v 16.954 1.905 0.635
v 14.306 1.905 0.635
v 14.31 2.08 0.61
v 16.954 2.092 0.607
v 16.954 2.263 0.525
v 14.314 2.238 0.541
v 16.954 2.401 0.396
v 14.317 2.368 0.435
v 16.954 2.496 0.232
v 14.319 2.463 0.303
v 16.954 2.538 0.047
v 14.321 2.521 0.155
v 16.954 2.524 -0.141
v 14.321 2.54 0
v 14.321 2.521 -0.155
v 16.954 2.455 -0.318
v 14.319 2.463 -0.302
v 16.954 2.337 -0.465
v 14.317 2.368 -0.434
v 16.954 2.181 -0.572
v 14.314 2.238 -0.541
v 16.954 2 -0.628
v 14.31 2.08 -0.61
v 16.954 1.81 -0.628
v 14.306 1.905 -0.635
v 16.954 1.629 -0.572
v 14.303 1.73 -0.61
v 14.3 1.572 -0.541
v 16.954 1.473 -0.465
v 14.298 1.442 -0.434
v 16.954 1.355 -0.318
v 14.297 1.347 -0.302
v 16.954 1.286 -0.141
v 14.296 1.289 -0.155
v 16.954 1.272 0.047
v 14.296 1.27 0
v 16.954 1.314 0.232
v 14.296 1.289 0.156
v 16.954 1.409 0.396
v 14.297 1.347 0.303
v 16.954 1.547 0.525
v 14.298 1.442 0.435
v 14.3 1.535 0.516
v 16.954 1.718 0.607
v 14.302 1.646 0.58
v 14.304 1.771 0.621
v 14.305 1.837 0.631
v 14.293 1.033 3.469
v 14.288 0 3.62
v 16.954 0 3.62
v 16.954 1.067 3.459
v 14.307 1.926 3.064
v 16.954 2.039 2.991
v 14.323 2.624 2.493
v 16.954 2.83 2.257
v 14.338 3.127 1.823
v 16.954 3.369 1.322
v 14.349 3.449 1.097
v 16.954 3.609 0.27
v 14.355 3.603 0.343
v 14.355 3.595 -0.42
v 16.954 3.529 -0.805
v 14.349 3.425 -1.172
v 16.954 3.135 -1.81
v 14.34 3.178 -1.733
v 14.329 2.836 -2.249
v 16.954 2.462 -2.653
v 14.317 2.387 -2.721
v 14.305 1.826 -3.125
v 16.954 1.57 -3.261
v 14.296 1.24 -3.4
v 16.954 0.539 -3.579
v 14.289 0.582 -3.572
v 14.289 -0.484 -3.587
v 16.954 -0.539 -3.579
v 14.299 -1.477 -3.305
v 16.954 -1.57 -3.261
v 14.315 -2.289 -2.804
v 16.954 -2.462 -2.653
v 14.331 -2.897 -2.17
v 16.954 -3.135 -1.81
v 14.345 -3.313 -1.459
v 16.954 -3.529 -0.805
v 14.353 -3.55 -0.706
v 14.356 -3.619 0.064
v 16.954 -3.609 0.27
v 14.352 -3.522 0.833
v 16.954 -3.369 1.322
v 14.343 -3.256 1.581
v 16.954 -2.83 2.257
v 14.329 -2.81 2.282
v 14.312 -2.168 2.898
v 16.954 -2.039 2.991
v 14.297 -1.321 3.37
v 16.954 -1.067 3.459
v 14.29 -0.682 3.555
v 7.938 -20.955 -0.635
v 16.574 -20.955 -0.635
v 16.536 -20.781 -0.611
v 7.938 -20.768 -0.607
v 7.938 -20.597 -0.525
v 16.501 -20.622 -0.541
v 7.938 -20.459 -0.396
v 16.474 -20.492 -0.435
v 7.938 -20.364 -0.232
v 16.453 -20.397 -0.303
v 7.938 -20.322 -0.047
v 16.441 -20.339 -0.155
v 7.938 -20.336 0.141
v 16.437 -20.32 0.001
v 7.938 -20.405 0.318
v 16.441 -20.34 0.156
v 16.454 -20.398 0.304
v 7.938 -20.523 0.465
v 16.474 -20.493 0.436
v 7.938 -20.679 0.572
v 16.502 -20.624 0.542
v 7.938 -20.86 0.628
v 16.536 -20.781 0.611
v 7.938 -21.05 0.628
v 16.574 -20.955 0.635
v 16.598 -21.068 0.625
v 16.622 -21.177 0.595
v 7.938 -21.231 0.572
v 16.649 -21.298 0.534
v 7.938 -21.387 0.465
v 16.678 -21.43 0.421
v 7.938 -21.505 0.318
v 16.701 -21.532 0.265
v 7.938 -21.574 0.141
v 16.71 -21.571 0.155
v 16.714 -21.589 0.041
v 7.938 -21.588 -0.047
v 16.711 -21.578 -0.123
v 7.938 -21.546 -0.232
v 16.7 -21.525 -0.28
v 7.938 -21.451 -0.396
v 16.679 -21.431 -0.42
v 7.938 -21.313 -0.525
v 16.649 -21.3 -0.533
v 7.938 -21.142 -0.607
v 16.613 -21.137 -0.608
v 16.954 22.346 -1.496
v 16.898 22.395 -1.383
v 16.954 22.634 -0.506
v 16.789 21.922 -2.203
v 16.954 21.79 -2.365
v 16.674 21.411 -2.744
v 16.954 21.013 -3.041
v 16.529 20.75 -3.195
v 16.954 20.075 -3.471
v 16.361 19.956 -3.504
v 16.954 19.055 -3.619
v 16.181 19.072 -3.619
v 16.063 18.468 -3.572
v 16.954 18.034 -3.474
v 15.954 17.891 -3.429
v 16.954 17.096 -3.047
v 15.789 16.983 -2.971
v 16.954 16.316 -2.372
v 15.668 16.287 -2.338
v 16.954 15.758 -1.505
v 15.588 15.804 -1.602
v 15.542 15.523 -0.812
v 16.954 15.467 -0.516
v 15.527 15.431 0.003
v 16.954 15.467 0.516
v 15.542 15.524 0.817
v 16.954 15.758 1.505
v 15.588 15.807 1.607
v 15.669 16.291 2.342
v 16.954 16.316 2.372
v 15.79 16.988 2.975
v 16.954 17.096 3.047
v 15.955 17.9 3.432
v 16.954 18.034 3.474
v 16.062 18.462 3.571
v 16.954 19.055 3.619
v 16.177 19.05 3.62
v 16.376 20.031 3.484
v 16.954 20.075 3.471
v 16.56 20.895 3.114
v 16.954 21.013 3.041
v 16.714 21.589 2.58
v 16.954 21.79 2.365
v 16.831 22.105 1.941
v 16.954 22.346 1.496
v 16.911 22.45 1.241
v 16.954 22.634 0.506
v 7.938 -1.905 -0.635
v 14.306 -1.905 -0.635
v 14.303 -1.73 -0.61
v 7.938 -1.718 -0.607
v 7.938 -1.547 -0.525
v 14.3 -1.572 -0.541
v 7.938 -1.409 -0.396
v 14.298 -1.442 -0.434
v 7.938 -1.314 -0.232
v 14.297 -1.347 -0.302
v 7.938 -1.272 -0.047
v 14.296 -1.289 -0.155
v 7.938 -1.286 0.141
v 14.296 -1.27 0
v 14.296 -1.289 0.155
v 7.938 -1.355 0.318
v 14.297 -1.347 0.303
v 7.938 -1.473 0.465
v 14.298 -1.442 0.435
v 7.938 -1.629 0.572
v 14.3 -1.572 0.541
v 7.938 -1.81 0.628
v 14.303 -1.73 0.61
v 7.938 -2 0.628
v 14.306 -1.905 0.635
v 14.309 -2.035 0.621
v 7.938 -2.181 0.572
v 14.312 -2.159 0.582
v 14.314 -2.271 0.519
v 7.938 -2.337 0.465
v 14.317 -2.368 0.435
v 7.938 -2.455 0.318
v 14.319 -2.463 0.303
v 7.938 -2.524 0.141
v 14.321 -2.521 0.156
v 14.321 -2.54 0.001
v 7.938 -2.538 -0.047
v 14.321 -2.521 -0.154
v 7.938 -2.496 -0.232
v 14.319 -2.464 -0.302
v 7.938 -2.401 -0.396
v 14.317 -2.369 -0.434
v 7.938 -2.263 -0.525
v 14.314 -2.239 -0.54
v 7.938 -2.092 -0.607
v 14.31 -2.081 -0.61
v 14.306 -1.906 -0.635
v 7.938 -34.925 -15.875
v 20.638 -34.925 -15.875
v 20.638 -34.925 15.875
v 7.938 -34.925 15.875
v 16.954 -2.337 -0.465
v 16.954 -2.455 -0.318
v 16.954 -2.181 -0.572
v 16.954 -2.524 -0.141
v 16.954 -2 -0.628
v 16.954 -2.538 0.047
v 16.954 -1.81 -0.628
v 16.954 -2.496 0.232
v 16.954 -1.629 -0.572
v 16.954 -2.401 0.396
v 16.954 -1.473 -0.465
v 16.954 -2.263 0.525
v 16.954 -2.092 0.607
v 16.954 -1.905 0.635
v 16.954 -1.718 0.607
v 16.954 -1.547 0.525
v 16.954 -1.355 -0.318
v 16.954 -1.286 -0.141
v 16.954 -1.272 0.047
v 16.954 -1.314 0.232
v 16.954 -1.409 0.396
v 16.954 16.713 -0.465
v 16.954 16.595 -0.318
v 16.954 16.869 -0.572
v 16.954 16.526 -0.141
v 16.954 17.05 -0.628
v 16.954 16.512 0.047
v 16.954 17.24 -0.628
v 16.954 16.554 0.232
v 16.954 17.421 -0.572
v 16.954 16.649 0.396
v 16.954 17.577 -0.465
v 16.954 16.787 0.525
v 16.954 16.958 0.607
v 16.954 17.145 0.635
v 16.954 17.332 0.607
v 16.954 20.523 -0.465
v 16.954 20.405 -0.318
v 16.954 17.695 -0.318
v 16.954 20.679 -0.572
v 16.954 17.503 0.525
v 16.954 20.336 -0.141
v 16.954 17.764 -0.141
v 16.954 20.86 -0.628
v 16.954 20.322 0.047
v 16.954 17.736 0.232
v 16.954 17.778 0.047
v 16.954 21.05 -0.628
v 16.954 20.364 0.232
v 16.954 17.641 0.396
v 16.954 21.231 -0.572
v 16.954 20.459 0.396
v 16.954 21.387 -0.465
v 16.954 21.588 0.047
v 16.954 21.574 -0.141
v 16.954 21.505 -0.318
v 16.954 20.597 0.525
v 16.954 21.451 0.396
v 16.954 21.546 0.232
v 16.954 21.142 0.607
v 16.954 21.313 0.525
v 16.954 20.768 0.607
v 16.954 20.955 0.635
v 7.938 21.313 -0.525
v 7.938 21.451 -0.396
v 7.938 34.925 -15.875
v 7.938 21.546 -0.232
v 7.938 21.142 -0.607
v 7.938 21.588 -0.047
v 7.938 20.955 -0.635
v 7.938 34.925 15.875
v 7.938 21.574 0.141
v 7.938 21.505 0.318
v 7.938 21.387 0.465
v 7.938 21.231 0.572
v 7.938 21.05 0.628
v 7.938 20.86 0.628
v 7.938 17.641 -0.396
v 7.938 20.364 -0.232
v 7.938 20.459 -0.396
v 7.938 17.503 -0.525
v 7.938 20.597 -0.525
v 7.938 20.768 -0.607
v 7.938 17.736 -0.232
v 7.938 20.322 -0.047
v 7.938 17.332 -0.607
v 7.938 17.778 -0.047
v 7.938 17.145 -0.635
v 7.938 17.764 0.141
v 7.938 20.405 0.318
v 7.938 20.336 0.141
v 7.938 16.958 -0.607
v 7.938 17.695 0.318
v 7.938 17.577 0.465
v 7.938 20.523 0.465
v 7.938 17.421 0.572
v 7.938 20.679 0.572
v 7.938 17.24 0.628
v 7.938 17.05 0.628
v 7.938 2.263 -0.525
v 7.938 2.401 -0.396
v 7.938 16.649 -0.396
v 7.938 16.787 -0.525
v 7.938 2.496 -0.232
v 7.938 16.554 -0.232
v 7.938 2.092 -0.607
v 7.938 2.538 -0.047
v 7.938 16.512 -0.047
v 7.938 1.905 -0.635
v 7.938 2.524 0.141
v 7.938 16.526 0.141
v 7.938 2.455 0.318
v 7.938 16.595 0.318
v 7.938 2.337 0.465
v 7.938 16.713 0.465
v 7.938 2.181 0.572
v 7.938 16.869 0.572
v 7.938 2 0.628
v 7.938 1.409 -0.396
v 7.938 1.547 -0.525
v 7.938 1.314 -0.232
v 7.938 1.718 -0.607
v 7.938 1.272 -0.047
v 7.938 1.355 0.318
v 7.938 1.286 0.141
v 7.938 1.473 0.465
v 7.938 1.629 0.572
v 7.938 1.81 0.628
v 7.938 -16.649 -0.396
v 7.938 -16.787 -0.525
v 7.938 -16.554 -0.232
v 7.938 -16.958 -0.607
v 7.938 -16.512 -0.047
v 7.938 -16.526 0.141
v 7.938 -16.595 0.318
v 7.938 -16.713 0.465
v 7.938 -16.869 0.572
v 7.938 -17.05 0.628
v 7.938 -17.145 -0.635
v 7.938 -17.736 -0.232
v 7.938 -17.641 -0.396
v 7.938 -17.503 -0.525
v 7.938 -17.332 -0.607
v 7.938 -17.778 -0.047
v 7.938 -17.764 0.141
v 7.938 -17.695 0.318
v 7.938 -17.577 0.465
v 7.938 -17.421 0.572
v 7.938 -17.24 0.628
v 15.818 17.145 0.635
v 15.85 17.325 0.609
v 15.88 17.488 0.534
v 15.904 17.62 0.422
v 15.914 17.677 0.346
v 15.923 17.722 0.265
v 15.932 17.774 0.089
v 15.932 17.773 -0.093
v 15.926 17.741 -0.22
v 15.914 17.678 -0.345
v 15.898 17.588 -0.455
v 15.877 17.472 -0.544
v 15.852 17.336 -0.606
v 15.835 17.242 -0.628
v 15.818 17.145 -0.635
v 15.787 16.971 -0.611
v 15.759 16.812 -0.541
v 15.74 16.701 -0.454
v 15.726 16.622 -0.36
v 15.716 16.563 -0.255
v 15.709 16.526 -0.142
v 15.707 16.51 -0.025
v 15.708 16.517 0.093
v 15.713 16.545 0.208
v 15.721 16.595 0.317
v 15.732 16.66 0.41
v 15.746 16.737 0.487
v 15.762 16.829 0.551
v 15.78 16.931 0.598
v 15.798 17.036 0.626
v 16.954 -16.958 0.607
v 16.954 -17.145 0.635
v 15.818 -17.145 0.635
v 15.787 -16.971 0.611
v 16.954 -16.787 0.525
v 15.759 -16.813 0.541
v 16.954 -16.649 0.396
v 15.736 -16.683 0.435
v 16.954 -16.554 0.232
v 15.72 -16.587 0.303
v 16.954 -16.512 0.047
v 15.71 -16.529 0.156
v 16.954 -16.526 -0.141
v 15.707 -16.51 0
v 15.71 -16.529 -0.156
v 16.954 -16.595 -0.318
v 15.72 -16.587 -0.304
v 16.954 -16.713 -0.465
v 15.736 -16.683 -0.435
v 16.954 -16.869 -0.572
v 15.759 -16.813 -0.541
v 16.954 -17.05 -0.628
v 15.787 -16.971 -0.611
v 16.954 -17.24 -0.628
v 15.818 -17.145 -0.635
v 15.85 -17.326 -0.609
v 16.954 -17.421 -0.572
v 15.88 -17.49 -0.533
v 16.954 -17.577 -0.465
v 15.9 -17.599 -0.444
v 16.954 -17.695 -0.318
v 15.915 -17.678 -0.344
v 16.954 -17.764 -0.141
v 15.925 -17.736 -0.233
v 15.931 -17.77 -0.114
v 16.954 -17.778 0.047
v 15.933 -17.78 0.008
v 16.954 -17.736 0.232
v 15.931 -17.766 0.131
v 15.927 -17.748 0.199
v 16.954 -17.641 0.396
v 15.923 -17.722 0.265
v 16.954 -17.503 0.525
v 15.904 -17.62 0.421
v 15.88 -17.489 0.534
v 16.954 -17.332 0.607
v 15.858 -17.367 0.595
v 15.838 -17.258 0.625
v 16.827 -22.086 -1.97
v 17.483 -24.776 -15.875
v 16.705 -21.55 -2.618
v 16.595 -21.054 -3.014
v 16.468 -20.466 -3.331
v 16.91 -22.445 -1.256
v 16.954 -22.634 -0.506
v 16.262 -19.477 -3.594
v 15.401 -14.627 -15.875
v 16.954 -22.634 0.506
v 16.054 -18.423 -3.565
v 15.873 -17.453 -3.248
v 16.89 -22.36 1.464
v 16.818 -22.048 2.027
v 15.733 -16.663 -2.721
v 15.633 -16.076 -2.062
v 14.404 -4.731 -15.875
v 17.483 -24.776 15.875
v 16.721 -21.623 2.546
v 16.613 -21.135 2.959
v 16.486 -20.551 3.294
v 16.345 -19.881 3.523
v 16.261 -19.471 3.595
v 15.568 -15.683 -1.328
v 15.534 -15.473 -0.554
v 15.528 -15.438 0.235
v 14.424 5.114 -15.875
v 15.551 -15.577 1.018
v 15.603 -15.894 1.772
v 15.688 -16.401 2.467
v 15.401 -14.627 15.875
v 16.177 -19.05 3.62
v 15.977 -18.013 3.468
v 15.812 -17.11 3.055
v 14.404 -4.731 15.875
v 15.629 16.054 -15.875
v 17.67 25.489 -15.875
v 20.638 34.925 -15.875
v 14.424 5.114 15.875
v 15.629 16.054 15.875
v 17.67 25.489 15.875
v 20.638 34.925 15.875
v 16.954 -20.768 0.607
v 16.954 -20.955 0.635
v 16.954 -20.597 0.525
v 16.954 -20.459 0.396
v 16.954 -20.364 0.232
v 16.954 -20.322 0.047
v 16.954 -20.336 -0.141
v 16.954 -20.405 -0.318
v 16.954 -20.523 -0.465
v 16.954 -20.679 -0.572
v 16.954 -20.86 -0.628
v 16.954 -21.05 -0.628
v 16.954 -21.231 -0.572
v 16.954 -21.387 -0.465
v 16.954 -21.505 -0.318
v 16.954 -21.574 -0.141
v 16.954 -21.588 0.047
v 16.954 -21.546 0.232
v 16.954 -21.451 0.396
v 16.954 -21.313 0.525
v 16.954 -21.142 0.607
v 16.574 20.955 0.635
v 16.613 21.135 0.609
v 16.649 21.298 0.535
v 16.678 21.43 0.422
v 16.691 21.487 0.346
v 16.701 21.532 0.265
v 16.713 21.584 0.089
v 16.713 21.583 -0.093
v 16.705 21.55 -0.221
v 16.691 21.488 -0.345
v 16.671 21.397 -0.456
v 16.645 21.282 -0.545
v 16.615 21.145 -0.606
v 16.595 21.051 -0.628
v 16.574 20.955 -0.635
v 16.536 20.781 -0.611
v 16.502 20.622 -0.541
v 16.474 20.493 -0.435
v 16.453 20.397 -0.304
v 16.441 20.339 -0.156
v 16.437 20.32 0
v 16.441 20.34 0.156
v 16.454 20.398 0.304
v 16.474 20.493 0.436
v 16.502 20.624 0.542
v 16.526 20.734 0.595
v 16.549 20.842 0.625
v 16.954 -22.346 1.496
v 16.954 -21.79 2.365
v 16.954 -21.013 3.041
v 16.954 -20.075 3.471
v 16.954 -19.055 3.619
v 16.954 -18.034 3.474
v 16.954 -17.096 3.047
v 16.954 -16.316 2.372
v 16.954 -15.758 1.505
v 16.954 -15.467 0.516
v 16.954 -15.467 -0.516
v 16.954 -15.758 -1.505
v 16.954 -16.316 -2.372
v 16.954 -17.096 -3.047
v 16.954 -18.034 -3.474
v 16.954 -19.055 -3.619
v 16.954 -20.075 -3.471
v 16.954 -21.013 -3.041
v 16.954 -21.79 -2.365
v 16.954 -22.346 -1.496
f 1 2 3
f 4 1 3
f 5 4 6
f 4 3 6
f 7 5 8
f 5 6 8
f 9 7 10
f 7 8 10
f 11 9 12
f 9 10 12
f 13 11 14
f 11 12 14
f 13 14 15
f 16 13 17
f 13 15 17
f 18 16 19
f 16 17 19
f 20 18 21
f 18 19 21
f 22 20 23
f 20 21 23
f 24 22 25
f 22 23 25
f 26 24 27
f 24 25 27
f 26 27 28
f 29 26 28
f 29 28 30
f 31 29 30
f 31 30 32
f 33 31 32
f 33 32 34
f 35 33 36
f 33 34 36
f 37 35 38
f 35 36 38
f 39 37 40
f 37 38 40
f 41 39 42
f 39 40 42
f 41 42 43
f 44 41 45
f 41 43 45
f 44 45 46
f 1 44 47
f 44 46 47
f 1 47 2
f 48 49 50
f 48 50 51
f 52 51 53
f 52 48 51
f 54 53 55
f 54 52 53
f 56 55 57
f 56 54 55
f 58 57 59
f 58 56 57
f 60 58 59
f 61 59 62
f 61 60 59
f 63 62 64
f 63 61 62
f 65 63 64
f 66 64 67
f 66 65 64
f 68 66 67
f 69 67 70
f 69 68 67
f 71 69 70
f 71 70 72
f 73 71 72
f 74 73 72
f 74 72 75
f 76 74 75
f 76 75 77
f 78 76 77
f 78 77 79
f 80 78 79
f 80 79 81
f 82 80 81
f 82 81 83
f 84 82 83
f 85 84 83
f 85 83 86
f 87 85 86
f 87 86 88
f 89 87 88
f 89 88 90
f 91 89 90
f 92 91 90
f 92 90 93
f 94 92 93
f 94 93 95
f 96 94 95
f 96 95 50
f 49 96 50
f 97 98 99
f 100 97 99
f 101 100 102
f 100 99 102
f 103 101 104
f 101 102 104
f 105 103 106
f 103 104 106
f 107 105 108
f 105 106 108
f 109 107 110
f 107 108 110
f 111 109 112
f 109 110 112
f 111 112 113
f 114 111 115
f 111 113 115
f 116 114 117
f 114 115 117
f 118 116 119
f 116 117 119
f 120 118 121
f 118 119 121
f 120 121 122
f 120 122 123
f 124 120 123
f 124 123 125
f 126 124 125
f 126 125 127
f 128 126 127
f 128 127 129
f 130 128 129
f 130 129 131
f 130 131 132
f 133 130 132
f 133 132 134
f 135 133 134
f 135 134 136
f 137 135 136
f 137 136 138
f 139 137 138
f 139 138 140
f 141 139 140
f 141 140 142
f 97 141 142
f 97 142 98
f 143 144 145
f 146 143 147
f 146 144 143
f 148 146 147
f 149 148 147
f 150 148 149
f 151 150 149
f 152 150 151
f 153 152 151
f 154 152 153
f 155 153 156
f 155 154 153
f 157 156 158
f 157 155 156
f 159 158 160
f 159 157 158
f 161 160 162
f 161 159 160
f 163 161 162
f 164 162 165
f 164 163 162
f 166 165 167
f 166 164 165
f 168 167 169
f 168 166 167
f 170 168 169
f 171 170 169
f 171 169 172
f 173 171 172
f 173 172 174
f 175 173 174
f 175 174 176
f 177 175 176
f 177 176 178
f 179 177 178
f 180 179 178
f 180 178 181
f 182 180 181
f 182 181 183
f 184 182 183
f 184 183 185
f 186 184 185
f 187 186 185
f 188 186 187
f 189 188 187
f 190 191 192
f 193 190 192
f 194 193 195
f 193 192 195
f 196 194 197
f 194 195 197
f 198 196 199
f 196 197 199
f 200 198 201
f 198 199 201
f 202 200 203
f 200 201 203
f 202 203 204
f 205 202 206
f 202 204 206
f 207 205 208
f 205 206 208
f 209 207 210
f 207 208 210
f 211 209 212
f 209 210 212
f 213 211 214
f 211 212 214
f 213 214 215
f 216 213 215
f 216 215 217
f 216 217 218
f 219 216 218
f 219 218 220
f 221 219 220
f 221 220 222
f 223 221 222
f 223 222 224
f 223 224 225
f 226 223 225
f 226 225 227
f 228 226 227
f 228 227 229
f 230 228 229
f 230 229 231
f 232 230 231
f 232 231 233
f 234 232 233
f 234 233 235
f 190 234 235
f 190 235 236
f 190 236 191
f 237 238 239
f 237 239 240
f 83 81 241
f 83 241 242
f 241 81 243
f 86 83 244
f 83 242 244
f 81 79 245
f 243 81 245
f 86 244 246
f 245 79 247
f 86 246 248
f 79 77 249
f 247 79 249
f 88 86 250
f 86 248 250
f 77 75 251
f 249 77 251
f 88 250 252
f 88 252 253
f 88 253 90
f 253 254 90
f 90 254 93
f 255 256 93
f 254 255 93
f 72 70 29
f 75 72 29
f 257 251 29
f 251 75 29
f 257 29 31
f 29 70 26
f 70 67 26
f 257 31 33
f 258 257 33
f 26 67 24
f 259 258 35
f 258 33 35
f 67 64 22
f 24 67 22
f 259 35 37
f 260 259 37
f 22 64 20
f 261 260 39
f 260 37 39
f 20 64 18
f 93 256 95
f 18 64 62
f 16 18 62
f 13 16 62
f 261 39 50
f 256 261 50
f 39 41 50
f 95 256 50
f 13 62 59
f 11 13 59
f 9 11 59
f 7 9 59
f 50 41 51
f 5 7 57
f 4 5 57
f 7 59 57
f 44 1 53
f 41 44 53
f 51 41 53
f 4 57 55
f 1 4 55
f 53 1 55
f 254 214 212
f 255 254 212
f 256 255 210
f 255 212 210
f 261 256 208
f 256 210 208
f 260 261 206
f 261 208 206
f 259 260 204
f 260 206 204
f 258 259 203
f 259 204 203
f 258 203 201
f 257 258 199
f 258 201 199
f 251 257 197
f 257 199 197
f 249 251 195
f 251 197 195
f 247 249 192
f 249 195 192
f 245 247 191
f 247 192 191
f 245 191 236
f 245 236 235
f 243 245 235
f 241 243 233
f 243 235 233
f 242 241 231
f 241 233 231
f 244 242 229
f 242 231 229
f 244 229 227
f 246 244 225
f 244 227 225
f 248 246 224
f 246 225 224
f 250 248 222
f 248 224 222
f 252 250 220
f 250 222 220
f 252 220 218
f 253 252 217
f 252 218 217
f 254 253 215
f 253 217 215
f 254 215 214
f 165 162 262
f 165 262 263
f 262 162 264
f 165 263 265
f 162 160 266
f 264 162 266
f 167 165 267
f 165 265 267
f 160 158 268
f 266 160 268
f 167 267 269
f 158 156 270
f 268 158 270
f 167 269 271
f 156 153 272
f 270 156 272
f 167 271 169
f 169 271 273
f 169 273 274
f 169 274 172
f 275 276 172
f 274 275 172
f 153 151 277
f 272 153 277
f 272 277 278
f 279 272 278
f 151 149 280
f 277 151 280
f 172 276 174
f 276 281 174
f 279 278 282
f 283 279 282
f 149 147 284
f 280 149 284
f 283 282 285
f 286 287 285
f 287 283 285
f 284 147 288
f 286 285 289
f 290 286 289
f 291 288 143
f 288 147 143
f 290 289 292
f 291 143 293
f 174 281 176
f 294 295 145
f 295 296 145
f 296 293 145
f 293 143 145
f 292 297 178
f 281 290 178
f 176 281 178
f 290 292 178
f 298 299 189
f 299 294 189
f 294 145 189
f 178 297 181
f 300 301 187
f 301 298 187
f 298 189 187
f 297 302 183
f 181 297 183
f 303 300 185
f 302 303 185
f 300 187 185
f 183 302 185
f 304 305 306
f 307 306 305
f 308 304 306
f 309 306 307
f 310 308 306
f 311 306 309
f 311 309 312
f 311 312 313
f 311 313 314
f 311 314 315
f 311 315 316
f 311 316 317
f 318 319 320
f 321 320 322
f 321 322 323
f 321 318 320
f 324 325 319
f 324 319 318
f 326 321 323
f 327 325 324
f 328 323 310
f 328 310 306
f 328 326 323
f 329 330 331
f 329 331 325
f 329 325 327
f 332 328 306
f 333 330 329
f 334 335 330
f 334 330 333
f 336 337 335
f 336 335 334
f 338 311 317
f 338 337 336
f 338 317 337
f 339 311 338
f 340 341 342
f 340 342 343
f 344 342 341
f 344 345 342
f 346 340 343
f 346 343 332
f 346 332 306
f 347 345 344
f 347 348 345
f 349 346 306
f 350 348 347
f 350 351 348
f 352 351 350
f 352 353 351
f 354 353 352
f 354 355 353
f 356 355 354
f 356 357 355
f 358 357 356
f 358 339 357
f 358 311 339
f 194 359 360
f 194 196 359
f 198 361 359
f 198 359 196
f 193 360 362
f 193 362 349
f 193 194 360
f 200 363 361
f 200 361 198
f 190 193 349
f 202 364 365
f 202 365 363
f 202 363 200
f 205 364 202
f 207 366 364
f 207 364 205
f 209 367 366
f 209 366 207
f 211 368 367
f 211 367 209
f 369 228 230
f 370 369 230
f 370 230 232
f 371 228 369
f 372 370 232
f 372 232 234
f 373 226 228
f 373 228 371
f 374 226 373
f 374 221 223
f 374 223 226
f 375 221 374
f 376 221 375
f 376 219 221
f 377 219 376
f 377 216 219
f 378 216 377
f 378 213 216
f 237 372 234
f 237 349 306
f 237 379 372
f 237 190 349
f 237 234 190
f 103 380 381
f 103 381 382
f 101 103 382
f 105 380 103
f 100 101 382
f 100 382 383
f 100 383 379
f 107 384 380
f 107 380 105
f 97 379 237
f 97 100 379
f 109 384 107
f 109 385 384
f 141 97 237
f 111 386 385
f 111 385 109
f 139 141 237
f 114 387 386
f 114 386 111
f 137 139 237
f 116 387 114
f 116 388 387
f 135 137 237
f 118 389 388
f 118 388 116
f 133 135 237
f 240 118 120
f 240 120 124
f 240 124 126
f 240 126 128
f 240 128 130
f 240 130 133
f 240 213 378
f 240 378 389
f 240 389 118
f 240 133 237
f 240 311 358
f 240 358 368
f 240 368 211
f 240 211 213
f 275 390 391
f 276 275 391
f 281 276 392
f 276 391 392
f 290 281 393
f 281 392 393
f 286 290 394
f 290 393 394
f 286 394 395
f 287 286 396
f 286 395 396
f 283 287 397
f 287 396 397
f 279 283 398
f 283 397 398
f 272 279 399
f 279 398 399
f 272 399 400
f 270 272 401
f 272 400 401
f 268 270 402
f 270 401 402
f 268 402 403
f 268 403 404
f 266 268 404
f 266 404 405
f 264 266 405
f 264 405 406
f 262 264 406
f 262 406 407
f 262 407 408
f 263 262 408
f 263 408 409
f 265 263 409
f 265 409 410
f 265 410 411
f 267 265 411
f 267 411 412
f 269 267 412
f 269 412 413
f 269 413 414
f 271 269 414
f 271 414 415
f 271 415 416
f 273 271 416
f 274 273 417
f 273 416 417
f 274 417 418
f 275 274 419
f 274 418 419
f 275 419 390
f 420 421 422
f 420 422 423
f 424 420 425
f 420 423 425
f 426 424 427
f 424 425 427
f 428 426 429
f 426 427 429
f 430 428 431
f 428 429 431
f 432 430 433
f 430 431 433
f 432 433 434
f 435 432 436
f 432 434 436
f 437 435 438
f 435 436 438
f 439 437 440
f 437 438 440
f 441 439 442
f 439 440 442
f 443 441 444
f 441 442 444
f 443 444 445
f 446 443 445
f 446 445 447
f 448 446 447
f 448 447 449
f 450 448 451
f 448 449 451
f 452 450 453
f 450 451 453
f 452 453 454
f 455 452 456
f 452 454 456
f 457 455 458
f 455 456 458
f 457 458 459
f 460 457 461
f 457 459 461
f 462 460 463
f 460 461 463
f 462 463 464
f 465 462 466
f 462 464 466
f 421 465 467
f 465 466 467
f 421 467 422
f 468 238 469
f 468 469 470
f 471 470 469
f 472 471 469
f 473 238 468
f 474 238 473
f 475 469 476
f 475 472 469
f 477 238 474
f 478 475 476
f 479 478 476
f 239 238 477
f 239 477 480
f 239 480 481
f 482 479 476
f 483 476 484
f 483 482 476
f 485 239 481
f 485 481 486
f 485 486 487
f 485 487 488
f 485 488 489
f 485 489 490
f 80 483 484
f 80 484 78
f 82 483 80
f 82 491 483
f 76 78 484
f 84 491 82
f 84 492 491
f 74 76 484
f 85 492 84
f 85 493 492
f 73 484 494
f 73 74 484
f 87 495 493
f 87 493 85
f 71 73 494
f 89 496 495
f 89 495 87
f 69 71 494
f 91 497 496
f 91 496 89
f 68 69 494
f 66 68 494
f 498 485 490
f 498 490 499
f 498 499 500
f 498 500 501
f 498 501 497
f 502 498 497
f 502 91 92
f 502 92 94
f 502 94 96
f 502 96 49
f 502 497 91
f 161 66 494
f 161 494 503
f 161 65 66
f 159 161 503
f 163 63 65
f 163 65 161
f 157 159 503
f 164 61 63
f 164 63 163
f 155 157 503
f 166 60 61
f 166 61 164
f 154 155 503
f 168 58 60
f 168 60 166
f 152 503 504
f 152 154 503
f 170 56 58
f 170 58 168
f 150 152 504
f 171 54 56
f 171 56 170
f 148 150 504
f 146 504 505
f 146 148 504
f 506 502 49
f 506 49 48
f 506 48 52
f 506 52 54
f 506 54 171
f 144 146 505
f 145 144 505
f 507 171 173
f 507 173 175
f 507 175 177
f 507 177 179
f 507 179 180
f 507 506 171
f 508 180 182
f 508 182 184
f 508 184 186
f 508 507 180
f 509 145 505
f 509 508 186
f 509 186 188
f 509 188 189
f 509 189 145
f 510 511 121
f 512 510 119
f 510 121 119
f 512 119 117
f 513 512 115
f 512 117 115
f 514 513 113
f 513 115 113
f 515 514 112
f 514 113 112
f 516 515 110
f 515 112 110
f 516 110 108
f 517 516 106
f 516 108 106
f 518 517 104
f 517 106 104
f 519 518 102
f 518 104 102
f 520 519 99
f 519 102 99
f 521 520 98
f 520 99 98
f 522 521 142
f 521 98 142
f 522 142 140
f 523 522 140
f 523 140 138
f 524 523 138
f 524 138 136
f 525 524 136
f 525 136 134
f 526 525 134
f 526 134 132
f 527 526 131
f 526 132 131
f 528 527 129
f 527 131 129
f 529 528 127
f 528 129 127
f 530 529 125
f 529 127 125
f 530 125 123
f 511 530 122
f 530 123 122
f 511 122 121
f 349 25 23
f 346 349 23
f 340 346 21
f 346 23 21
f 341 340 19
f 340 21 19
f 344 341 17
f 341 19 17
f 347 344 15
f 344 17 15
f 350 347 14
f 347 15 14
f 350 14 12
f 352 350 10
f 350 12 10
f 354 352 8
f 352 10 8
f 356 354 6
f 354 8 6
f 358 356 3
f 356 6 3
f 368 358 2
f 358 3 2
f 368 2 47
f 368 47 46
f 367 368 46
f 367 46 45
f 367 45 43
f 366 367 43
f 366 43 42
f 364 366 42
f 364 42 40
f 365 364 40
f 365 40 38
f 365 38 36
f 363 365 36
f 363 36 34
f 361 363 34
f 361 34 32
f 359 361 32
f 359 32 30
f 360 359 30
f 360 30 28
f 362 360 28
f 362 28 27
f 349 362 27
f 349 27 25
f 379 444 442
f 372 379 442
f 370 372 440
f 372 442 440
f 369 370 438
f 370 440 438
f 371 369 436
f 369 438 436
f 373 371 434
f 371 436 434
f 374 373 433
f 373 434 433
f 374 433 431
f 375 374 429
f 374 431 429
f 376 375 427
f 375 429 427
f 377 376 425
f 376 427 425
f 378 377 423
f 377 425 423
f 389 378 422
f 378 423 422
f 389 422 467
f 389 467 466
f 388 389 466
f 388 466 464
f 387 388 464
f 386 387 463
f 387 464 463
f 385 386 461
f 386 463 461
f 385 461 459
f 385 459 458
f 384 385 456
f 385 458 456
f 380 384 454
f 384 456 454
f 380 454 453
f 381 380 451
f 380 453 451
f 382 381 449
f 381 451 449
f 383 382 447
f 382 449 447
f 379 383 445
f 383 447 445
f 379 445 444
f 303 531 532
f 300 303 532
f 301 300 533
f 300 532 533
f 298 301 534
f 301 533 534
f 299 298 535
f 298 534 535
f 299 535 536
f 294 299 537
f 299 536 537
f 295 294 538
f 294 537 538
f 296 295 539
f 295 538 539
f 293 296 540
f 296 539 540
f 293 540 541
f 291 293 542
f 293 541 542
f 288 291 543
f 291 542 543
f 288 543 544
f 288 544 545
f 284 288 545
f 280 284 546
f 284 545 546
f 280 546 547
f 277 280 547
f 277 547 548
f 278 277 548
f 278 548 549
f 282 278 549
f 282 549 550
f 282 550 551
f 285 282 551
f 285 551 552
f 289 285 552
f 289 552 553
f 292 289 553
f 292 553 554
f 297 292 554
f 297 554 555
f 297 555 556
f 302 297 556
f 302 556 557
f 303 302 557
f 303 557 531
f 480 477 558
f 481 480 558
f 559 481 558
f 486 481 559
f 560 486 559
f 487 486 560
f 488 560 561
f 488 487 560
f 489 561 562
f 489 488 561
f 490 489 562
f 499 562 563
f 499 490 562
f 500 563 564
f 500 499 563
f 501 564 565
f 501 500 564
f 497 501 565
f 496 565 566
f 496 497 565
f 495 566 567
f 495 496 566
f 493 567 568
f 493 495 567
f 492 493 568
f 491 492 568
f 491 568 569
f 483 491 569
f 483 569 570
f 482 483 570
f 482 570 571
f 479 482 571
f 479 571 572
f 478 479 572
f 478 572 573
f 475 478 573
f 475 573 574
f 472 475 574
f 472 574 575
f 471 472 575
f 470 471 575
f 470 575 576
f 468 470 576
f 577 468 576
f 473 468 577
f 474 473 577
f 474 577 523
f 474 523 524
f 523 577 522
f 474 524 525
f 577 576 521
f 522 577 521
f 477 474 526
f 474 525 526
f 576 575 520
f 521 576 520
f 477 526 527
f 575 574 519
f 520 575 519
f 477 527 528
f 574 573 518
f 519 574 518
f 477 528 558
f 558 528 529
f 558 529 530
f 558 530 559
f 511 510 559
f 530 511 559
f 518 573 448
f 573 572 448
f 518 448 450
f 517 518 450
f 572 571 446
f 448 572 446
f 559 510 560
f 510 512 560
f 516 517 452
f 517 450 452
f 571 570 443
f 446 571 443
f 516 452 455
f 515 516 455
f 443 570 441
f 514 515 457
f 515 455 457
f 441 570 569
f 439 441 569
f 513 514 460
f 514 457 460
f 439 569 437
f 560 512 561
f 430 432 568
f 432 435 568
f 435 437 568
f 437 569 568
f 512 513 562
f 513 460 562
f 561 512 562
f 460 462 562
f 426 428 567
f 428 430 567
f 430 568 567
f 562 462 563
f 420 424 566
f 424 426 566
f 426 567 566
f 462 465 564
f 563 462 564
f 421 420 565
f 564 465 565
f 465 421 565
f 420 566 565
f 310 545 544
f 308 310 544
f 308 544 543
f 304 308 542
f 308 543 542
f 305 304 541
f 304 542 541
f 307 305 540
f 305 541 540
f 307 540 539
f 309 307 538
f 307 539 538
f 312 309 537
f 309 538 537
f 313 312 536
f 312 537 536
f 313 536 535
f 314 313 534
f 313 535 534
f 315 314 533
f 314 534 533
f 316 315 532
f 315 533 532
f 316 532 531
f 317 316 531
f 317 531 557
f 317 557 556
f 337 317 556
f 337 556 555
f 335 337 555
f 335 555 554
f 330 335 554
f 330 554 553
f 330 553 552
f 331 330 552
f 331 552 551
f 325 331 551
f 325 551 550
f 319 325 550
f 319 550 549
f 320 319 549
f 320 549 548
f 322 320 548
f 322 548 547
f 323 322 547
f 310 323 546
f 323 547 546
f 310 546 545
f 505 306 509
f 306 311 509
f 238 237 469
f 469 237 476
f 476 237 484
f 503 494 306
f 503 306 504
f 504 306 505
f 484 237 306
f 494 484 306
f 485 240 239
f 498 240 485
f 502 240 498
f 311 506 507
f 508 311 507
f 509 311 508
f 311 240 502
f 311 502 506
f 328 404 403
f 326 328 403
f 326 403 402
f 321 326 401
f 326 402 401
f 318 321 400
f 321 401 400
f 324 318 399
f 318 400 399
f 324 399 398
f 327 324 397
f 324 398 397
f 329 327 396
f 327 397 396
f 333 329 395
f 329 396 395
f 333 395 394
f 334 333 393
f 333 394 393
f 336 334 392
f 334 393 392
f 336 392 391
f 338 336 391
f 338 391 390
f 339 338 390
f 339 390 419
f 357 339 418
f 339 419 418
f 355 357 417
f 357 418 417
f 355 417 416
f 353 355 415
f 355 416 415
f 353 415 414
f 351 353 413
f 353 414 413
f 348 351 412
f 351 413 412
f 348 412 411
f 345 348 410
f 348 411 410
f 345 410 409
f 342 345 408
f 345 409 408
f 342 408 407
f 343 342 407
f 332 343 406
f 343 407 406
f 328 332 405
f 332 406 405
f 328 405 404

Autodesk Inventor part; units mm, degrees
ref_plane "YZ Plane" through (0, 0, 0) normal (1, 0, 0) x (0, 1, 0)
ref_plane "XZ Plane" through (0, 0, 0) normal (0, 1, 0) x (-1, 0, 0)
ref_plane "Work Plane1" through (6.35, -34.925, 15.875) normal (0, 0, 1) x (1, 0, 0)
sketch "Sketch3" plane through (6.35, -34.925, 15.875) normal (0, 0, 1) x (1, 0, 0)
  line L0 (1.5875, 69.85) -> (1.5875, 0) projected
  line L1 (14.2875, 0) -> (1.5875, 34.925) construction
  line L2 (1.5875, 34.925) -> (14.2875, 69.85) construction
  spline S0 degree 2 poles (14.2875, 0) (1.5875, 34.925) (14.2875, 69.85) knots 1 1 1 2 2 2
  line L3 (1.5875, 69.85) -> (14.2875, 69.85)
  line L4 (14.2875, 0) -> (1.5875, 0)
  point P0 (-6.35, 34.925)
  dimension "d9" = 12.7
  dimension "d10" = 12.7
extrude "Extrusion3" add sketch "Sketch3" against normal blind 31.75
sketch "Sketch4" plane through (7.9375, -34.925, 15.875) normal (-1, 0, 0) x (0, 0, 1)
  line L0 (0, 69.85) -> (0, 0) projected
  line L1 (0, 69.85) -> (-31.75, 69.85) projected
  line L2 (-31.75, 0) -> (-31.75, 69.85) projected
  line L3 (0, 0) -> (-31.75, 0) projected
  line L4 (0, 0) -> (-31.75, 0) construction
  line L5 (-15.875, 0) -> (-15.875, 69.85) construction
  line L6 (0, 69.85) -> (-31.75, 69.85) construction
  circle A0 centre (-15.875, 33.02) radius 0.635
  circle A1 centre (-15.875, 36.83) radius 0.635
  circle A2 centre (-15.875, 34.925) radius 3.6195
  circle A3 centre (-15.875, 52.07) radius 0.635
  circle A4 centre (-15.875, 55.88) radius 0.635
  circle A5 centre (-15.875, 53.975) radius 3.6195
  circle A6 centre (-15.875, 13.97) radius 0.635
  circle A7 centre (-15.875, 17.78) radius 0.635
  circle A8 centre (-15.875, 15.875) radius 3.6195
  circle A9 centre (-15.875, 33.02) radius 0.635
  circle A10 centre (-15.875, 36.83) radius 0.635
  circle A11 centre (-15.875, 34.925) radius 3.6195
  dimension "d13" = 1.27
  dimension "d14" = 1.27
  dimension "d15" = 1.905
  dimension "d16" = 1.905
  dimension "d17" = 7.239
  dimension "d20" = 19.05
  dimension "d23" = 19.05
extrude "Extrusion4" add sketch "Sketch4" against normal blind 9.017 contours A2 | A5 | A8
sketch "Sketch5" plane through (16.9545, -34.925, 15.875) normal (1, 0, 0) x (0, 0, -1)
  arc A0 (15.3692, 57.559) -> (16.3808, 57.559) centre (15.875, 53.975) ccw projected
  circle A1 centre (15.875, 55.88) radius 0.635 projected
  circle A2 centre (15.875, 52.07) radius 0.635 projected
  circle A3 centre (15.875, 34.925) radius 3.6195 projected
  circle A4 centre (15.875, 33.02) radius 0.635 projected
  circle A5 centre (15.875, 36.83) radius 0.635 projected
  arc A6 (16.3808, 12.291) -> (15.3692, 12.291) centre (15.875, 15.875) ccw projected
  circle A7 centre (15.875, 17.78) radius 0.635 projected
  circle A8 centre (15.875, 13.97) radius 0.635 projected
extrude "Extrusion5" cut sketch "Sketch5" against normal blind 9.017 contours A1 | A2 | A4 | A5 | A7 | A8
properties part number "LED Reflector"
